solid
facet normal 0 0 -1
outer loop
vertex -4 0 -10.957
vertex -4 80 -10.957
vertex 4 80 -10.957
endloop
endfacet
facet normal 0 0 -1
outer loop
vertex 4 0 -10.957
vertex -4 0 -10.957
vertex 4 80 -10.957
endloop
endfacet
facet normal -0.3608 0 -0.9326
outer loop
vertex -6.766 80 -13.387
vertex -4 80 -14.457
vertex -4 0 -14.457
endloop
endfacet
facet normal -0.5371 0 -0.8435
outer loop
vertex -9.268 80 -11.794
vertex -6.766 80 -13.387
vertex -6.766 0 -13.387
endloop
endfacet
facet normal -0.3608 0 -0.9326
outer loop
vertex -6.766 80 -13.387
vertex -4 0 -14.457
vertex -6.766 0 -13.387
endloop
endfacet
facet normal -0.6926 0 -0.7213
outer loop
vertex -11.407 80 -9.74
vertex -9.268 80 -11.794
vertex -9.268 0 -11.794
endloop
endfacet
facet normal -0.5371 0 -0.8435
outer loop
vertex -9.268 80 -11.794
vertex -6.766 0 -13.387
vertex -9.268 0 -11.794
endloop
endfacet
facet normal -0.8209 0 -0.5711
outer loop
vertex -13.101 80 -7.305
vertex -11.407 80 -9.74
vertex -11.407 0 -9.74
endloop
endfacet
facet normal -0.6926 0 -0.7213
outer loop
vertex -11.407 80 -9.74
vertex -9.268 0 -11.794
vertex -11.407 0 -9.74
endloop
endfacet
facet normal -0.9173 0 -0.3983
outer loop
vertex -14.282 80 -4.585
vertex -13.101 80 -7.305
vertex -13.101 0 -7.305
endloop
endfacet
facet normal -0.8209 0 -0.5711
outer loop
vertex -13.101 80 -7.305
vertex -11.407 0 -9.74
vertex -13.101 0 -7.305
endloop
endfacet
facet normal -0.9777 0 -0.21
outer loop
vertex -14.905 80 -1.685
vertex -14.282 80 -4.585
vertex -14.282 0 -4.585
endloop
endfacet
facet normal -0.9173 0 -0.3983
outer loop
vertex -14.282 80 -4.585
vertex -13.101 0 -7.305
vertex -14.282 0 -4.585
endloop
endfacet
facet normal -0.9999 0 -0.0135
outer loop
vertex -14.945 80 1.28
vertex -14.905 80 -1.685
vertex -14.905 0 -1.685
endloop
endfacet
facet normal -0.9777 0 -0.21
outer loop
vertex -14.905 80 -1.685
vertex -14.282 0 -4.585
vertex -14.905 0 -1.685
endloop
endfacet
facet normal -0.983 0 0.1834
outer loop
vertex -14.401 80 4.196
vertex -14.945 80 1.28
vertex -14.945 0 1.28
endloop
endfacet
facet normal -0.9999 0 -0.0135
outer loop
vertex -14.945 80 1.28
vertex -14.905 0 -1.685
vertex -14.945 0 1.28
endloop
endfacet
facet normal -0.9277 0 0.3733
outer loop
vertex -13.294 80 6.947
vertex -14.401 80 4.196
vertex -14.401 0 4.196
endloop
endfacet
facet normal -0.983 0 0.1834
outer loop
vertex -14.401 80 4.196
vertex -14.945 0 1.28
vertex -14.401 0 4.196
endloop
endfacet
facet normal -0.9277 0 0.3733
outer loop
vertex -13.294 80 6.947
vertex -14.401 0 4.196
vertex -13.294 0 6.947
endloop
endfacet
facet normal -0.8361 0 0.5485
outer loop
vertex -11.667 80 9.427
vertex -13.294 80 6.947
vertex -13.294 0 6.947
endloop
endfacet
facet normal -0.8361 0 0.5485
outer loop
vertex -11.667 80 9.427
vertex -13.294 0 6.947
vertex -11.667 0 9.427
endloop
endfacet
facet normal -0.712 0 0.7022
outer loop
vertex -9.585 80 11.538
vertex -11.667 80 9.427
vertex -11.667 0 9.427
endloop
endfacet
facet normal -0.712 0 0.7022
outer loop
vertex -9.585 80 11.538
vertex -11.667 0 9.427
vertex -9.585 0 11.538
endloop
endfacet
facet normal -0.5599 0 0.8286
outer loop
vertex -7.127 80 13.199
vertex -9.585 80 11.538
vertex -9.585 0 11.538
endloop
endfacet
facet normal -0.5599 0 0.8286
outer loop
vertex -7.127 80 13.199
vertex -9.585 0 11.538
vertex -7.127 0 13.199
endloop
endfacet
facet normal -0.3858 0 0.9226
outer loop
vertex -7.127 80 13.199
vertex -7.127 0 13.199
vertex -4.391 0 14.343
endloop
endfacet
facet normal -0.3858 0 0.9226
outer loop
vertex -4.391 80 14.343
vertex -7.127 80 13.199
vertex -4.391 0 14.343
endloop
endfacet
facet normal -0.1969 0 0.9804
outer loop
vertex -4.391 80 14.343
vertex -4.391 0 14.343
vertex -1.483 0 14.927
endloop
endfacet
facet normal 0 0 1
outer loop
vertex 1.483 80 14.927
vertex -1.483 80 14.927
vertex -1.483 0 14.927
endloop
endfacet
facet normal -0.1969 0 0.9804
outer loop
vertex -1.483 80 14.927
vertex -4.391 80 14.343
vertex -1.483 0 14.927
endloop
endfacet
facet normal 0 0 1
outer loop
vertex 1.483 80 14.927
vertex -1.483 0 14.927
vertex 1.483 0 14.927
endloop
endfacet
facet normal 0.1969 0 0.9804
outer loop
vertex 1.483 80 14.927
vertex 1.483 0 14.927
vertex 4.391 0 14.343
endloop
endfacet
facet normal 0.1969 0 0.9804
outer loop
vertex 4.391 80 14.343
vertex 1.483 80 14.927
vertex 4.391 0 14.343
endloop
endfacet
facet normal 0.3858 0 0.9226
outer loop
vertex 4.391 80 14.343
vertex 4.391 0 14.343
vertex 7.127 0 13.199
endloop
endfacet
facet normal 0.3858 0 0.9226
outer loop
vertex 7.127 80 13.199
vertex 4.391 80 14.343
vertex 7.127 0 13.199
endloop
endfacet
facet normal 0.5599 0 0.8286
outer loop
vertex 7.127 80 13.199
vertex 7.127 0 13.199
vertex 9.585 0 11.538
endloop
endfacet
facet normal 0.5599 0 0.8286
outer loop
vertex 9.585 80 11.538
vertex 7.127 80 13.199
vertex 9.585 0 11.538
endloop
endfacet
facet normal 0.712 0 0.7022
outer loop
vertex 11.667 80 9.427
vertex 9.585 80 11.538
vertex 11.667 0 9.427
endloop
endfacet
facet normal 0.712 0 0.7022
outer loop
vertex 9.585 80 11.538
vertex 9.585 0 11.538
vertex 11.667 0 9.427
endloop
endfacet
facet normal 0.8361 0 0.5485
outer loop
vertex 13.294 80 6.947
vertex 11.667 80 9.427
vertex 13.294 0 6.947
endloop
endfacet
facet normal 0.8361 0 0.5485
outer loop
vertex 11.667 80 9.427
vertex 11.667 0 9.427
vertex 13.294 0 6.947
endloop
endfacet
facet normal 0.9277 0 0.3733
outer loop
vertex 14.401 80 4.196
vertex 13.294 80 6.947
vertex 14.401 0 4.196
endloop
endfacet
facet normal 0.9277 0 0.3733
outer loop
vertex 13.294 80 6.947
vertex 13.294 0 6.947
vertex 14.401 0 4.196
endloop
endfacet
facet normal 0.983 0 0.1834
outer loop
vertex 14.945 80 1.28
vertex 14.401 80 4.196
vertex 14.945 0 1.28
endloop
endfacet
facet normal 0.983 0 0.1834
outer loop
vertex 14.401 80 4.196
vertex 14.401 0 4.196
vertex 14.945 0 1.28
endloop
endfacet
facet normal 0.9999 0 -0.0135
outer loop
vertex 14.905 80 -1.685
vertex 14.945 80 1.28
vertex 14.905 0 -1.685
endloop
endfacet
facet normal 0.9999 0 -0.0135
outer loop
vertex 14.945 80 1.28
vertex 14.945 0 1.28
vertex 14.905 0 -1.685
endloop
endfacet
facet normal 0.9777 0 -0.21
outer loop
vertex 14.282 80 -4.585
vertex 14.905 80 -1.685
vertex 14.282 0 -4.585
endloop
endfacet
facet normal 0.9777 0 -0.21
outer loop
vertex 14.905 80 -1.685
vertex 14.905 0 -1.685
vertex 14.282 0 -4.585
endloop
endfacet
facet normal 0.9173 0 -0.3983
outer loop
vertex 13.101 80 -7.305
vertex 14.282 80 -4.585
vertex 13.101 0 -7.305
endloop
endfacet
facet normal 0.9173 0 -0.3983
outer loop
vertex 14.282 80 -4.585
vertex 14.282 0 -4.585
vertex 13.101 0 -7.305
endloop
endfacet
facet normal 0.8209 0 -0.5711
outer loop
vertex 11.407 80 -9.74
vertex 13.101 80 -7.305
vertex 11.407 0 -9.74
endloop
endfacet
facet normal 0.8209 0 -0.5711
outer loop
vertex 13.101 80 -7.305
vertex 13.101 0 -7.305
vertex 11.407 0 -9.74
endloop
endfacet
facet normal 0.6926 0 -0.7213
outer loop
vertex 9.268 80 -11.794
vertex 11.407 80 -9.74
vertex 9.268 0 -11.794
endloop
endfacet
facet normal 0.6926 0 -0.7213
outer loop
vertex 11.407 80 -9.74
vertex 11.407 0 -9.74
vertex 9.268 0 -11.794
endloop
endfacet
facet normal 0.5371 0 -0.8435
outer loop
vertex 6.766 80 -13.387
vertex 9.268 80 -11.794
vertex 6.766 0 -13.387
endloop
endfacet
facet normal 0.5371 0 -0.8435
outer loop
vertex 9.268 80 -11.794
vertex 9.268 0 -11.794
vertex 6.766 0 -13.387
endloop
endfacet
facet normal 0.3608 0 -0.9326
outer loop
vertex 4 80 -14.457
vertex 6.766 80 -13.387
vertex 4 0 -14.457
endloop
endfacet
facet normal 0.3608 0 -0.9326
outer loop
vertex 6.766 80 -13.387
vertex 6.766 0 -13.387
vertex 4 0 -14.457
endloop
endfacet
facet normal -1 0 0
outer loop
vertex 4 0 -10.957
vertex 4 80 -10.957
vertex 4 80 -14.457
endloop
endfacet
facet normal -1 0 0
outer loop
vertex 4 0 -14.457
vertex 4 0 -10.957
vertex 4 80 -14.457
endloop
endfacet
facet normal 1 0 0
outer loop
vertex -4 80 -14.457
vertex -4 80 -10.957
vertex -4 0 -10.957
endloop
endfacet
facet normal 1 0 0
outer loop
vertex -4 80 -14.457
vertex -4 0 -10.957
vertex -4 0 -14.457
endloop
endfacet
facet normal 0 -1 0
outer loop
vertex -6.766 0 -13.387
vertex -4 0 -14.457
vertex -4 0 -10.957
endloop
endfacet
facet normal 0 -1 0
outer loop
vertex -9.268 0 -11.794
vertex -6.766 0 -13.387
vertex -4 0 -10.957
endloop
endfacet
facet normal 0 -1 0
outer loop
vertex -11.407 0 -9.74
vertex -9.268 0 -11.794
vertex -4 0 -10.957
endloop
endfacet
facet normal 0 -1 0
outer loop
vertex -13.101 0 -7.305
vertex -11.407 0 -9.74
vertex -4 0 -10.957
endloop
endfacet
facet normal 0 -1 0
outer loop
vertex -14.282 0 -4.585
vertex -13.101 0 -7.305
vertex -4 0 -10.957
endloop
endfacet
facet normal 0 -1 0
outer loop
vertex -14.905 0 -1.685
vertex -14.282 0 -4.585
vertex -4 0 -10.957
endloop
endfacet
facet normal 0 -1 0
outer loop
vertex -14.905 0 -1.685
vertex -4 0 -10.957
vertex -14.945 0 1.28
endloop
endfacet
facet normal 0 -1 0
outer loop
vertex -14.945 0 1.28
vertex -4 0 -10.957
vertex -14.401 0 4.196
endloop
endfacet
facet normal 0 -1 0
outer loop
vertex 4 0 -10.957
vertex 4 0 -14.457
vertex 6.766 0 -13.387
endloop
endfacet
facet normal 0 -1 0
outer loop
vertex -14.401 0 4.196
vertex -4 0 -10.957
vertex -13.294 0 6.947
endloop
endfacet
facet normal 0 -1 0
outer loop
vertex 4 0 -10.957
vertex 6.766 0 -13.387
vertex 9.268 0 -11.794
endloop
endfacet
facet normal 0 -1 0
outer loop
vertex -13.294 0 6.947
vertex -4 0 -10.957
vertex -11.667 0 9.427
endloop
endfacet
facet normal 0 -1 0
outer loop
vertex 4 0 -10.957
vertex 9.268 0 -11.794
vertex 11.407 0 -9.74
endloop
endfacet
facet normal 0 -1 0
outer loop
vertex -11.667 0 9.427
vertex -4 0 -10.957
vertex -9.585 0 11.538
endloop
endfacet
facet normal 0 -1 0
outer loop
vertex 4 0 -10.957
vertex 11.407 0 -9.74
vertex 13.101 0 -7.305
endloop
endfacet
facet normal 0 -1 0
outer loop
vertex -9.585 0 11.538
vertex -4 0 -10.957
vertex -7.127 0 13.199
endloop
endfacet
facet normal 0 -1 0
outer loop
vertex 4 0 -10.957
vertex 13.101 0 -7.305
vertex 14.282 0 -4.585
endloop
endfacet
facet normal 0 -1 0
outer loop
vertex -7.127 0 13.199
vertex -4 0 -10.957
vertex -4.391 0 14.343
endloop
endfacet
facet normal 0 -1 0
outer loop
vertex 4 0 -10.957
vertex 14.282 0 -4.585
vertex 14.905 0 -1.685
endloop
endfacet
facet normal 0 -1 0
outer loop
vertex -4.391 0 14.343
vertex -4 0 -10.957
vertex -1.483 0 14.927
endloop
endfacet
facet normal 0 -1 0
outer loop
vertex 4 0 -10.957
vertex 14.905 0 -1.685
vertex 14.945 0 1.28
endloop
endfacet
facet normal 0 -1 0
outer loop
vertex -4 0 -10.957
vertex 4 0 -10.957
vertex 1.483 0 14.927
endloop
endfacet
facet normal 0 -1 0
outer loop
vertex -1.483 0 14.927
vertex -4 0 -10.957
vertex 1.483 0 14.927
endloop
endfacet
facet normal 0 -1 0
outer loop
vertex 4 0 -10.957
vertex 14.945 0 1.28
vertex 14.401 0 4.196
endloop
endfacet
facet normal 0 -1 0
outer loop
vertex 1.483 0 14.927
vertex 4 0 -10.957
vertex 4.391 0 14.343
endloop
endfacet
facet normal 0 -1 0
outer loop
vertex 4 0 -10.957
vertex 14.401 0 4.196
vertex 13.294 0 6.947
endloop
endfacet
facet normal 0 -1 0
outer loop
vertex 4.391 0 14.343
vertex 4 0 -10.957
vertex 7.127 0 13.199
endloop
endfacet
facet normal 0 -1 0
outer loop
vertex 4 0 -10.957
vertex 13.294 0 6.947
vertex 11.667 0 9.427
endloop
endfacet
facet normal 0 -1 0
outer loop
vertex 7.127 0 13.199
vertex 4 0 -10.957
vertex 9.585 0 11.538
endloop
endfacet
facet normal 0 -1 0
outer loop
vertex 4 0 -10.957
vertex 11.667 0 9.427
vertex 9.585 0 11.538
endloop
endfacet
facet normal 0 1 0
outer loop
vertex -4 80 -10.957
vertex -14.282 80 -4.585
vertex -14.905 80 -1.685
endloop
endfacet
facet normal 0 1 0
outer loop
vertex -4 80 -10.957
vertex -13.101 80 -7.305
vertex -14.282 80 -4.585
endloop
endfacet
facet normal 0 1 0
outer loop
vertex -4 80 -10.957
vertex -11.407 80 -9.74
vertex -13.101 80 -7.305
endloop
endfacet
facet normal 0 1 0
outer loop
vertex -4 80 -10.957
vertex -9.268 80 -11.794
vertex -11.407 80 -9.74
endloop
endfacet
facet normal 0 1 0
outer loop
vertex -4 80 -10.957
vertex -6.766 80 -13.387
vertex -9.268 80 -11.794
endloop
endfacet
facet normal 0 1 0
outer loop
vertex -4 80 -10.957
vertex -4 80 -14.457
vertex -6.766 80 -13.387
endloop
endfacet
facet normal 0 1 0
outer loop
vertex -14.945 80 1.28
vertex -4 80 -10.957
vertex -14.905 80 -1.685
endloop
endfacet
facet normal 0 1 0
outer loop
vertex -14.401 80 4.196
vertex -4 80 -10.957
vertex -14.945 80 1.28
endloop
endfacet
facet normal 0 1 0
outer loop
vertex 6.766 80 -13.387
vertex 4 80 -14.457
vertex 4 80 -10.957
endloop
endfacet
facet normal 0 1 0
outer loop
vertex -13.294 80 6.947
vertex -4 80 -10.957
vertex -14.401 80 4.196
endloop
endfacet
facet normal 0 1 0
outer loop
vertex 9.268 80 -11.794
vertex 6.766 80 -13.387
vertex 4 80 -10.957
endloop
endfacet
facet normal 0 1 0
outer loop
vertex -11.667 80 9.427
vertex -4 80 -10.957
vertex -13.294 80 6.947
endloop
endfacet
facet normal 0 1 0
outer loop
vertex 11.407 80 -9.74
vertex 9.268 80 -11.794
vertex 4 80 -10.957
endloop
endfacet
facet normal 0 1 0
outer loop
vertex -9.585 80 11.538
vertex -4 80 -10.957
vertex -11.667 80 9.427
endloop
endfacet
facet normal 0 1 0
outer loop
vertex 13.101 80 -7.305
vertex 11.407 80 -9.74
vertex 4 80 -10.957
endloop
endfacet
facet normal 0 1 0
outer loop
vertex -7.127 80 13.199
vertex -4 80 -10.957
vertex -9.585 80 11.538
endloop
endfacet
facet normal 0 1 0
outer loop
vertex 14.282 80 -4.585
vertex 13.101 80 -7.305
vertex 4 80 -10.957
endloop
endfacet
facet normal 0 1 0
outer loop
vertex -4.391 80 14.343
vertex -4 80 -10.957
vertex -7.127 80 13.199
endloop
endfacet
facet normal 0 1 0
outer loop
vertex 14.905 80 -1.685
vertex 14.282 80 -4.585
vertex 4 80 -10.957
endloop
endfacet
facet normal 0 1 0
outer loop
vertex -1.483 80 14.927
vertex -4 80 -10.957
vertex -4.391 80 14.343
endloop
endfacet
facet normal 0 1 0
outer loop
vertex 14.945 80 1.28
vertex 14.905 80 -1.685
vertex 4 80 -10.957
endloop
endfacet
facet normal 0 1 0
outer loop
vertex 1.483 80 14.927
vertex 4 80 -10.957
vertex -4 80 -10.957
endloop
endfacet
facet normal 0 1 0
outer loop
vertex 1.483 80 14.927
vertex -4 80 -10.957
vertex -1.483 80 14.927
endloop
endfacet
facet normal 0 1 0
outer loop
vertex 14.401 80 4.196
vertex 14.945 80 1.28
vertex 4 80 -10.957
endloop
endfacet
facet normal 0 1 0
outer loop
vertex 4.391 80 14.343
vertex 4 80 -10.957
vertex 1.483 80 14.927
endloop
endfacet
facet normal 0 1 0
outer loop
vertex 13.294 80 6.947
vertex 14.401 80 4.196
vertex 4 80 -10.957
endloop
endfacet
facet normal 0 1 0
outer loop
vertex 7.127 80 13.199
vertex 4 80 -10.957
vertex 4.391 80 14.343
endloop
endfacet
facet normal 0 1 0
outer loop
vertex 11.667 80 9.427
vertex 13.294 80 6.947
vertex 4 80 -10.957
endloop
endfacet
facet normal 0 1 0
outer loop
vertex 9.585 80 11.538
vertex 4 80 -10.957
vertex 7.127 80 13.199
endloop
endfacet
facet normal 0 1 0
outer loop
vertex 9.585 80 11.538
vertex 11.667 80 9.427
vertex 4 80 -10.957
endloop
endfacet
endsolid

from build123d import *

# Parameters (mm, degrees)
SKETCH1_R           = 15
BOSS_EXTRUDE1_DEPTH = 80
SKETCH2_W           = 8
SKETCH2_H           = 3.5
CUT_EXTRUDE2_DEPTH  = 83.764726786
SKETCH5_W           = 8.467594852
SKETCH5_H           = 0.933653361
CUT_EXTRUDE3_DEPTH  = 83.764726786


with BuildPart() as part:
    # Sketch1 → Boss-Extrude1 (new body)
    with BuildSketch(Plane(origin=(0, 0, 0), x_dir=(1, 0, 0), z_dir=(0, 1, 0))):
        with Locations(Location((0, 0, 0), (0, 0, 270))):
            Circle(SKETCH1_R)
    extrude(amount=BOSS_EXTRUDE1_DEPTH)

    # Sketch2 → Cut-Extrude2 (cut, through all)
    with BuildSketch(Plane(origin=(0, 80, 0), x_dir=(1, 0, 0), z_dir=(0, 1, 0))):
        with Locations((0, 12.706832295)):
            Rectangle(SKETCH2_W, SKETCH2_H)
    extrude(amount=-CUT_EXTRUDE2_DEPTH, mode=Mode.SUBTRACT)

    # Sketch5 → Cut-Extrude3 (cut, through all)
    with BuildSketch(Plane(origin=(0, 80, 0), x_dir=(1, 0, 0), z_dir=(0, 1, 0))):
        with Locations((0.233797426, 14.923658976)):
            Rectangle(SKETCH5_W, SKETCH5_H)
    extrude(amount=-CUT_EXTRUDE3_DEPTH, mode=Mode.SUBTRACT)


solid = part.part
